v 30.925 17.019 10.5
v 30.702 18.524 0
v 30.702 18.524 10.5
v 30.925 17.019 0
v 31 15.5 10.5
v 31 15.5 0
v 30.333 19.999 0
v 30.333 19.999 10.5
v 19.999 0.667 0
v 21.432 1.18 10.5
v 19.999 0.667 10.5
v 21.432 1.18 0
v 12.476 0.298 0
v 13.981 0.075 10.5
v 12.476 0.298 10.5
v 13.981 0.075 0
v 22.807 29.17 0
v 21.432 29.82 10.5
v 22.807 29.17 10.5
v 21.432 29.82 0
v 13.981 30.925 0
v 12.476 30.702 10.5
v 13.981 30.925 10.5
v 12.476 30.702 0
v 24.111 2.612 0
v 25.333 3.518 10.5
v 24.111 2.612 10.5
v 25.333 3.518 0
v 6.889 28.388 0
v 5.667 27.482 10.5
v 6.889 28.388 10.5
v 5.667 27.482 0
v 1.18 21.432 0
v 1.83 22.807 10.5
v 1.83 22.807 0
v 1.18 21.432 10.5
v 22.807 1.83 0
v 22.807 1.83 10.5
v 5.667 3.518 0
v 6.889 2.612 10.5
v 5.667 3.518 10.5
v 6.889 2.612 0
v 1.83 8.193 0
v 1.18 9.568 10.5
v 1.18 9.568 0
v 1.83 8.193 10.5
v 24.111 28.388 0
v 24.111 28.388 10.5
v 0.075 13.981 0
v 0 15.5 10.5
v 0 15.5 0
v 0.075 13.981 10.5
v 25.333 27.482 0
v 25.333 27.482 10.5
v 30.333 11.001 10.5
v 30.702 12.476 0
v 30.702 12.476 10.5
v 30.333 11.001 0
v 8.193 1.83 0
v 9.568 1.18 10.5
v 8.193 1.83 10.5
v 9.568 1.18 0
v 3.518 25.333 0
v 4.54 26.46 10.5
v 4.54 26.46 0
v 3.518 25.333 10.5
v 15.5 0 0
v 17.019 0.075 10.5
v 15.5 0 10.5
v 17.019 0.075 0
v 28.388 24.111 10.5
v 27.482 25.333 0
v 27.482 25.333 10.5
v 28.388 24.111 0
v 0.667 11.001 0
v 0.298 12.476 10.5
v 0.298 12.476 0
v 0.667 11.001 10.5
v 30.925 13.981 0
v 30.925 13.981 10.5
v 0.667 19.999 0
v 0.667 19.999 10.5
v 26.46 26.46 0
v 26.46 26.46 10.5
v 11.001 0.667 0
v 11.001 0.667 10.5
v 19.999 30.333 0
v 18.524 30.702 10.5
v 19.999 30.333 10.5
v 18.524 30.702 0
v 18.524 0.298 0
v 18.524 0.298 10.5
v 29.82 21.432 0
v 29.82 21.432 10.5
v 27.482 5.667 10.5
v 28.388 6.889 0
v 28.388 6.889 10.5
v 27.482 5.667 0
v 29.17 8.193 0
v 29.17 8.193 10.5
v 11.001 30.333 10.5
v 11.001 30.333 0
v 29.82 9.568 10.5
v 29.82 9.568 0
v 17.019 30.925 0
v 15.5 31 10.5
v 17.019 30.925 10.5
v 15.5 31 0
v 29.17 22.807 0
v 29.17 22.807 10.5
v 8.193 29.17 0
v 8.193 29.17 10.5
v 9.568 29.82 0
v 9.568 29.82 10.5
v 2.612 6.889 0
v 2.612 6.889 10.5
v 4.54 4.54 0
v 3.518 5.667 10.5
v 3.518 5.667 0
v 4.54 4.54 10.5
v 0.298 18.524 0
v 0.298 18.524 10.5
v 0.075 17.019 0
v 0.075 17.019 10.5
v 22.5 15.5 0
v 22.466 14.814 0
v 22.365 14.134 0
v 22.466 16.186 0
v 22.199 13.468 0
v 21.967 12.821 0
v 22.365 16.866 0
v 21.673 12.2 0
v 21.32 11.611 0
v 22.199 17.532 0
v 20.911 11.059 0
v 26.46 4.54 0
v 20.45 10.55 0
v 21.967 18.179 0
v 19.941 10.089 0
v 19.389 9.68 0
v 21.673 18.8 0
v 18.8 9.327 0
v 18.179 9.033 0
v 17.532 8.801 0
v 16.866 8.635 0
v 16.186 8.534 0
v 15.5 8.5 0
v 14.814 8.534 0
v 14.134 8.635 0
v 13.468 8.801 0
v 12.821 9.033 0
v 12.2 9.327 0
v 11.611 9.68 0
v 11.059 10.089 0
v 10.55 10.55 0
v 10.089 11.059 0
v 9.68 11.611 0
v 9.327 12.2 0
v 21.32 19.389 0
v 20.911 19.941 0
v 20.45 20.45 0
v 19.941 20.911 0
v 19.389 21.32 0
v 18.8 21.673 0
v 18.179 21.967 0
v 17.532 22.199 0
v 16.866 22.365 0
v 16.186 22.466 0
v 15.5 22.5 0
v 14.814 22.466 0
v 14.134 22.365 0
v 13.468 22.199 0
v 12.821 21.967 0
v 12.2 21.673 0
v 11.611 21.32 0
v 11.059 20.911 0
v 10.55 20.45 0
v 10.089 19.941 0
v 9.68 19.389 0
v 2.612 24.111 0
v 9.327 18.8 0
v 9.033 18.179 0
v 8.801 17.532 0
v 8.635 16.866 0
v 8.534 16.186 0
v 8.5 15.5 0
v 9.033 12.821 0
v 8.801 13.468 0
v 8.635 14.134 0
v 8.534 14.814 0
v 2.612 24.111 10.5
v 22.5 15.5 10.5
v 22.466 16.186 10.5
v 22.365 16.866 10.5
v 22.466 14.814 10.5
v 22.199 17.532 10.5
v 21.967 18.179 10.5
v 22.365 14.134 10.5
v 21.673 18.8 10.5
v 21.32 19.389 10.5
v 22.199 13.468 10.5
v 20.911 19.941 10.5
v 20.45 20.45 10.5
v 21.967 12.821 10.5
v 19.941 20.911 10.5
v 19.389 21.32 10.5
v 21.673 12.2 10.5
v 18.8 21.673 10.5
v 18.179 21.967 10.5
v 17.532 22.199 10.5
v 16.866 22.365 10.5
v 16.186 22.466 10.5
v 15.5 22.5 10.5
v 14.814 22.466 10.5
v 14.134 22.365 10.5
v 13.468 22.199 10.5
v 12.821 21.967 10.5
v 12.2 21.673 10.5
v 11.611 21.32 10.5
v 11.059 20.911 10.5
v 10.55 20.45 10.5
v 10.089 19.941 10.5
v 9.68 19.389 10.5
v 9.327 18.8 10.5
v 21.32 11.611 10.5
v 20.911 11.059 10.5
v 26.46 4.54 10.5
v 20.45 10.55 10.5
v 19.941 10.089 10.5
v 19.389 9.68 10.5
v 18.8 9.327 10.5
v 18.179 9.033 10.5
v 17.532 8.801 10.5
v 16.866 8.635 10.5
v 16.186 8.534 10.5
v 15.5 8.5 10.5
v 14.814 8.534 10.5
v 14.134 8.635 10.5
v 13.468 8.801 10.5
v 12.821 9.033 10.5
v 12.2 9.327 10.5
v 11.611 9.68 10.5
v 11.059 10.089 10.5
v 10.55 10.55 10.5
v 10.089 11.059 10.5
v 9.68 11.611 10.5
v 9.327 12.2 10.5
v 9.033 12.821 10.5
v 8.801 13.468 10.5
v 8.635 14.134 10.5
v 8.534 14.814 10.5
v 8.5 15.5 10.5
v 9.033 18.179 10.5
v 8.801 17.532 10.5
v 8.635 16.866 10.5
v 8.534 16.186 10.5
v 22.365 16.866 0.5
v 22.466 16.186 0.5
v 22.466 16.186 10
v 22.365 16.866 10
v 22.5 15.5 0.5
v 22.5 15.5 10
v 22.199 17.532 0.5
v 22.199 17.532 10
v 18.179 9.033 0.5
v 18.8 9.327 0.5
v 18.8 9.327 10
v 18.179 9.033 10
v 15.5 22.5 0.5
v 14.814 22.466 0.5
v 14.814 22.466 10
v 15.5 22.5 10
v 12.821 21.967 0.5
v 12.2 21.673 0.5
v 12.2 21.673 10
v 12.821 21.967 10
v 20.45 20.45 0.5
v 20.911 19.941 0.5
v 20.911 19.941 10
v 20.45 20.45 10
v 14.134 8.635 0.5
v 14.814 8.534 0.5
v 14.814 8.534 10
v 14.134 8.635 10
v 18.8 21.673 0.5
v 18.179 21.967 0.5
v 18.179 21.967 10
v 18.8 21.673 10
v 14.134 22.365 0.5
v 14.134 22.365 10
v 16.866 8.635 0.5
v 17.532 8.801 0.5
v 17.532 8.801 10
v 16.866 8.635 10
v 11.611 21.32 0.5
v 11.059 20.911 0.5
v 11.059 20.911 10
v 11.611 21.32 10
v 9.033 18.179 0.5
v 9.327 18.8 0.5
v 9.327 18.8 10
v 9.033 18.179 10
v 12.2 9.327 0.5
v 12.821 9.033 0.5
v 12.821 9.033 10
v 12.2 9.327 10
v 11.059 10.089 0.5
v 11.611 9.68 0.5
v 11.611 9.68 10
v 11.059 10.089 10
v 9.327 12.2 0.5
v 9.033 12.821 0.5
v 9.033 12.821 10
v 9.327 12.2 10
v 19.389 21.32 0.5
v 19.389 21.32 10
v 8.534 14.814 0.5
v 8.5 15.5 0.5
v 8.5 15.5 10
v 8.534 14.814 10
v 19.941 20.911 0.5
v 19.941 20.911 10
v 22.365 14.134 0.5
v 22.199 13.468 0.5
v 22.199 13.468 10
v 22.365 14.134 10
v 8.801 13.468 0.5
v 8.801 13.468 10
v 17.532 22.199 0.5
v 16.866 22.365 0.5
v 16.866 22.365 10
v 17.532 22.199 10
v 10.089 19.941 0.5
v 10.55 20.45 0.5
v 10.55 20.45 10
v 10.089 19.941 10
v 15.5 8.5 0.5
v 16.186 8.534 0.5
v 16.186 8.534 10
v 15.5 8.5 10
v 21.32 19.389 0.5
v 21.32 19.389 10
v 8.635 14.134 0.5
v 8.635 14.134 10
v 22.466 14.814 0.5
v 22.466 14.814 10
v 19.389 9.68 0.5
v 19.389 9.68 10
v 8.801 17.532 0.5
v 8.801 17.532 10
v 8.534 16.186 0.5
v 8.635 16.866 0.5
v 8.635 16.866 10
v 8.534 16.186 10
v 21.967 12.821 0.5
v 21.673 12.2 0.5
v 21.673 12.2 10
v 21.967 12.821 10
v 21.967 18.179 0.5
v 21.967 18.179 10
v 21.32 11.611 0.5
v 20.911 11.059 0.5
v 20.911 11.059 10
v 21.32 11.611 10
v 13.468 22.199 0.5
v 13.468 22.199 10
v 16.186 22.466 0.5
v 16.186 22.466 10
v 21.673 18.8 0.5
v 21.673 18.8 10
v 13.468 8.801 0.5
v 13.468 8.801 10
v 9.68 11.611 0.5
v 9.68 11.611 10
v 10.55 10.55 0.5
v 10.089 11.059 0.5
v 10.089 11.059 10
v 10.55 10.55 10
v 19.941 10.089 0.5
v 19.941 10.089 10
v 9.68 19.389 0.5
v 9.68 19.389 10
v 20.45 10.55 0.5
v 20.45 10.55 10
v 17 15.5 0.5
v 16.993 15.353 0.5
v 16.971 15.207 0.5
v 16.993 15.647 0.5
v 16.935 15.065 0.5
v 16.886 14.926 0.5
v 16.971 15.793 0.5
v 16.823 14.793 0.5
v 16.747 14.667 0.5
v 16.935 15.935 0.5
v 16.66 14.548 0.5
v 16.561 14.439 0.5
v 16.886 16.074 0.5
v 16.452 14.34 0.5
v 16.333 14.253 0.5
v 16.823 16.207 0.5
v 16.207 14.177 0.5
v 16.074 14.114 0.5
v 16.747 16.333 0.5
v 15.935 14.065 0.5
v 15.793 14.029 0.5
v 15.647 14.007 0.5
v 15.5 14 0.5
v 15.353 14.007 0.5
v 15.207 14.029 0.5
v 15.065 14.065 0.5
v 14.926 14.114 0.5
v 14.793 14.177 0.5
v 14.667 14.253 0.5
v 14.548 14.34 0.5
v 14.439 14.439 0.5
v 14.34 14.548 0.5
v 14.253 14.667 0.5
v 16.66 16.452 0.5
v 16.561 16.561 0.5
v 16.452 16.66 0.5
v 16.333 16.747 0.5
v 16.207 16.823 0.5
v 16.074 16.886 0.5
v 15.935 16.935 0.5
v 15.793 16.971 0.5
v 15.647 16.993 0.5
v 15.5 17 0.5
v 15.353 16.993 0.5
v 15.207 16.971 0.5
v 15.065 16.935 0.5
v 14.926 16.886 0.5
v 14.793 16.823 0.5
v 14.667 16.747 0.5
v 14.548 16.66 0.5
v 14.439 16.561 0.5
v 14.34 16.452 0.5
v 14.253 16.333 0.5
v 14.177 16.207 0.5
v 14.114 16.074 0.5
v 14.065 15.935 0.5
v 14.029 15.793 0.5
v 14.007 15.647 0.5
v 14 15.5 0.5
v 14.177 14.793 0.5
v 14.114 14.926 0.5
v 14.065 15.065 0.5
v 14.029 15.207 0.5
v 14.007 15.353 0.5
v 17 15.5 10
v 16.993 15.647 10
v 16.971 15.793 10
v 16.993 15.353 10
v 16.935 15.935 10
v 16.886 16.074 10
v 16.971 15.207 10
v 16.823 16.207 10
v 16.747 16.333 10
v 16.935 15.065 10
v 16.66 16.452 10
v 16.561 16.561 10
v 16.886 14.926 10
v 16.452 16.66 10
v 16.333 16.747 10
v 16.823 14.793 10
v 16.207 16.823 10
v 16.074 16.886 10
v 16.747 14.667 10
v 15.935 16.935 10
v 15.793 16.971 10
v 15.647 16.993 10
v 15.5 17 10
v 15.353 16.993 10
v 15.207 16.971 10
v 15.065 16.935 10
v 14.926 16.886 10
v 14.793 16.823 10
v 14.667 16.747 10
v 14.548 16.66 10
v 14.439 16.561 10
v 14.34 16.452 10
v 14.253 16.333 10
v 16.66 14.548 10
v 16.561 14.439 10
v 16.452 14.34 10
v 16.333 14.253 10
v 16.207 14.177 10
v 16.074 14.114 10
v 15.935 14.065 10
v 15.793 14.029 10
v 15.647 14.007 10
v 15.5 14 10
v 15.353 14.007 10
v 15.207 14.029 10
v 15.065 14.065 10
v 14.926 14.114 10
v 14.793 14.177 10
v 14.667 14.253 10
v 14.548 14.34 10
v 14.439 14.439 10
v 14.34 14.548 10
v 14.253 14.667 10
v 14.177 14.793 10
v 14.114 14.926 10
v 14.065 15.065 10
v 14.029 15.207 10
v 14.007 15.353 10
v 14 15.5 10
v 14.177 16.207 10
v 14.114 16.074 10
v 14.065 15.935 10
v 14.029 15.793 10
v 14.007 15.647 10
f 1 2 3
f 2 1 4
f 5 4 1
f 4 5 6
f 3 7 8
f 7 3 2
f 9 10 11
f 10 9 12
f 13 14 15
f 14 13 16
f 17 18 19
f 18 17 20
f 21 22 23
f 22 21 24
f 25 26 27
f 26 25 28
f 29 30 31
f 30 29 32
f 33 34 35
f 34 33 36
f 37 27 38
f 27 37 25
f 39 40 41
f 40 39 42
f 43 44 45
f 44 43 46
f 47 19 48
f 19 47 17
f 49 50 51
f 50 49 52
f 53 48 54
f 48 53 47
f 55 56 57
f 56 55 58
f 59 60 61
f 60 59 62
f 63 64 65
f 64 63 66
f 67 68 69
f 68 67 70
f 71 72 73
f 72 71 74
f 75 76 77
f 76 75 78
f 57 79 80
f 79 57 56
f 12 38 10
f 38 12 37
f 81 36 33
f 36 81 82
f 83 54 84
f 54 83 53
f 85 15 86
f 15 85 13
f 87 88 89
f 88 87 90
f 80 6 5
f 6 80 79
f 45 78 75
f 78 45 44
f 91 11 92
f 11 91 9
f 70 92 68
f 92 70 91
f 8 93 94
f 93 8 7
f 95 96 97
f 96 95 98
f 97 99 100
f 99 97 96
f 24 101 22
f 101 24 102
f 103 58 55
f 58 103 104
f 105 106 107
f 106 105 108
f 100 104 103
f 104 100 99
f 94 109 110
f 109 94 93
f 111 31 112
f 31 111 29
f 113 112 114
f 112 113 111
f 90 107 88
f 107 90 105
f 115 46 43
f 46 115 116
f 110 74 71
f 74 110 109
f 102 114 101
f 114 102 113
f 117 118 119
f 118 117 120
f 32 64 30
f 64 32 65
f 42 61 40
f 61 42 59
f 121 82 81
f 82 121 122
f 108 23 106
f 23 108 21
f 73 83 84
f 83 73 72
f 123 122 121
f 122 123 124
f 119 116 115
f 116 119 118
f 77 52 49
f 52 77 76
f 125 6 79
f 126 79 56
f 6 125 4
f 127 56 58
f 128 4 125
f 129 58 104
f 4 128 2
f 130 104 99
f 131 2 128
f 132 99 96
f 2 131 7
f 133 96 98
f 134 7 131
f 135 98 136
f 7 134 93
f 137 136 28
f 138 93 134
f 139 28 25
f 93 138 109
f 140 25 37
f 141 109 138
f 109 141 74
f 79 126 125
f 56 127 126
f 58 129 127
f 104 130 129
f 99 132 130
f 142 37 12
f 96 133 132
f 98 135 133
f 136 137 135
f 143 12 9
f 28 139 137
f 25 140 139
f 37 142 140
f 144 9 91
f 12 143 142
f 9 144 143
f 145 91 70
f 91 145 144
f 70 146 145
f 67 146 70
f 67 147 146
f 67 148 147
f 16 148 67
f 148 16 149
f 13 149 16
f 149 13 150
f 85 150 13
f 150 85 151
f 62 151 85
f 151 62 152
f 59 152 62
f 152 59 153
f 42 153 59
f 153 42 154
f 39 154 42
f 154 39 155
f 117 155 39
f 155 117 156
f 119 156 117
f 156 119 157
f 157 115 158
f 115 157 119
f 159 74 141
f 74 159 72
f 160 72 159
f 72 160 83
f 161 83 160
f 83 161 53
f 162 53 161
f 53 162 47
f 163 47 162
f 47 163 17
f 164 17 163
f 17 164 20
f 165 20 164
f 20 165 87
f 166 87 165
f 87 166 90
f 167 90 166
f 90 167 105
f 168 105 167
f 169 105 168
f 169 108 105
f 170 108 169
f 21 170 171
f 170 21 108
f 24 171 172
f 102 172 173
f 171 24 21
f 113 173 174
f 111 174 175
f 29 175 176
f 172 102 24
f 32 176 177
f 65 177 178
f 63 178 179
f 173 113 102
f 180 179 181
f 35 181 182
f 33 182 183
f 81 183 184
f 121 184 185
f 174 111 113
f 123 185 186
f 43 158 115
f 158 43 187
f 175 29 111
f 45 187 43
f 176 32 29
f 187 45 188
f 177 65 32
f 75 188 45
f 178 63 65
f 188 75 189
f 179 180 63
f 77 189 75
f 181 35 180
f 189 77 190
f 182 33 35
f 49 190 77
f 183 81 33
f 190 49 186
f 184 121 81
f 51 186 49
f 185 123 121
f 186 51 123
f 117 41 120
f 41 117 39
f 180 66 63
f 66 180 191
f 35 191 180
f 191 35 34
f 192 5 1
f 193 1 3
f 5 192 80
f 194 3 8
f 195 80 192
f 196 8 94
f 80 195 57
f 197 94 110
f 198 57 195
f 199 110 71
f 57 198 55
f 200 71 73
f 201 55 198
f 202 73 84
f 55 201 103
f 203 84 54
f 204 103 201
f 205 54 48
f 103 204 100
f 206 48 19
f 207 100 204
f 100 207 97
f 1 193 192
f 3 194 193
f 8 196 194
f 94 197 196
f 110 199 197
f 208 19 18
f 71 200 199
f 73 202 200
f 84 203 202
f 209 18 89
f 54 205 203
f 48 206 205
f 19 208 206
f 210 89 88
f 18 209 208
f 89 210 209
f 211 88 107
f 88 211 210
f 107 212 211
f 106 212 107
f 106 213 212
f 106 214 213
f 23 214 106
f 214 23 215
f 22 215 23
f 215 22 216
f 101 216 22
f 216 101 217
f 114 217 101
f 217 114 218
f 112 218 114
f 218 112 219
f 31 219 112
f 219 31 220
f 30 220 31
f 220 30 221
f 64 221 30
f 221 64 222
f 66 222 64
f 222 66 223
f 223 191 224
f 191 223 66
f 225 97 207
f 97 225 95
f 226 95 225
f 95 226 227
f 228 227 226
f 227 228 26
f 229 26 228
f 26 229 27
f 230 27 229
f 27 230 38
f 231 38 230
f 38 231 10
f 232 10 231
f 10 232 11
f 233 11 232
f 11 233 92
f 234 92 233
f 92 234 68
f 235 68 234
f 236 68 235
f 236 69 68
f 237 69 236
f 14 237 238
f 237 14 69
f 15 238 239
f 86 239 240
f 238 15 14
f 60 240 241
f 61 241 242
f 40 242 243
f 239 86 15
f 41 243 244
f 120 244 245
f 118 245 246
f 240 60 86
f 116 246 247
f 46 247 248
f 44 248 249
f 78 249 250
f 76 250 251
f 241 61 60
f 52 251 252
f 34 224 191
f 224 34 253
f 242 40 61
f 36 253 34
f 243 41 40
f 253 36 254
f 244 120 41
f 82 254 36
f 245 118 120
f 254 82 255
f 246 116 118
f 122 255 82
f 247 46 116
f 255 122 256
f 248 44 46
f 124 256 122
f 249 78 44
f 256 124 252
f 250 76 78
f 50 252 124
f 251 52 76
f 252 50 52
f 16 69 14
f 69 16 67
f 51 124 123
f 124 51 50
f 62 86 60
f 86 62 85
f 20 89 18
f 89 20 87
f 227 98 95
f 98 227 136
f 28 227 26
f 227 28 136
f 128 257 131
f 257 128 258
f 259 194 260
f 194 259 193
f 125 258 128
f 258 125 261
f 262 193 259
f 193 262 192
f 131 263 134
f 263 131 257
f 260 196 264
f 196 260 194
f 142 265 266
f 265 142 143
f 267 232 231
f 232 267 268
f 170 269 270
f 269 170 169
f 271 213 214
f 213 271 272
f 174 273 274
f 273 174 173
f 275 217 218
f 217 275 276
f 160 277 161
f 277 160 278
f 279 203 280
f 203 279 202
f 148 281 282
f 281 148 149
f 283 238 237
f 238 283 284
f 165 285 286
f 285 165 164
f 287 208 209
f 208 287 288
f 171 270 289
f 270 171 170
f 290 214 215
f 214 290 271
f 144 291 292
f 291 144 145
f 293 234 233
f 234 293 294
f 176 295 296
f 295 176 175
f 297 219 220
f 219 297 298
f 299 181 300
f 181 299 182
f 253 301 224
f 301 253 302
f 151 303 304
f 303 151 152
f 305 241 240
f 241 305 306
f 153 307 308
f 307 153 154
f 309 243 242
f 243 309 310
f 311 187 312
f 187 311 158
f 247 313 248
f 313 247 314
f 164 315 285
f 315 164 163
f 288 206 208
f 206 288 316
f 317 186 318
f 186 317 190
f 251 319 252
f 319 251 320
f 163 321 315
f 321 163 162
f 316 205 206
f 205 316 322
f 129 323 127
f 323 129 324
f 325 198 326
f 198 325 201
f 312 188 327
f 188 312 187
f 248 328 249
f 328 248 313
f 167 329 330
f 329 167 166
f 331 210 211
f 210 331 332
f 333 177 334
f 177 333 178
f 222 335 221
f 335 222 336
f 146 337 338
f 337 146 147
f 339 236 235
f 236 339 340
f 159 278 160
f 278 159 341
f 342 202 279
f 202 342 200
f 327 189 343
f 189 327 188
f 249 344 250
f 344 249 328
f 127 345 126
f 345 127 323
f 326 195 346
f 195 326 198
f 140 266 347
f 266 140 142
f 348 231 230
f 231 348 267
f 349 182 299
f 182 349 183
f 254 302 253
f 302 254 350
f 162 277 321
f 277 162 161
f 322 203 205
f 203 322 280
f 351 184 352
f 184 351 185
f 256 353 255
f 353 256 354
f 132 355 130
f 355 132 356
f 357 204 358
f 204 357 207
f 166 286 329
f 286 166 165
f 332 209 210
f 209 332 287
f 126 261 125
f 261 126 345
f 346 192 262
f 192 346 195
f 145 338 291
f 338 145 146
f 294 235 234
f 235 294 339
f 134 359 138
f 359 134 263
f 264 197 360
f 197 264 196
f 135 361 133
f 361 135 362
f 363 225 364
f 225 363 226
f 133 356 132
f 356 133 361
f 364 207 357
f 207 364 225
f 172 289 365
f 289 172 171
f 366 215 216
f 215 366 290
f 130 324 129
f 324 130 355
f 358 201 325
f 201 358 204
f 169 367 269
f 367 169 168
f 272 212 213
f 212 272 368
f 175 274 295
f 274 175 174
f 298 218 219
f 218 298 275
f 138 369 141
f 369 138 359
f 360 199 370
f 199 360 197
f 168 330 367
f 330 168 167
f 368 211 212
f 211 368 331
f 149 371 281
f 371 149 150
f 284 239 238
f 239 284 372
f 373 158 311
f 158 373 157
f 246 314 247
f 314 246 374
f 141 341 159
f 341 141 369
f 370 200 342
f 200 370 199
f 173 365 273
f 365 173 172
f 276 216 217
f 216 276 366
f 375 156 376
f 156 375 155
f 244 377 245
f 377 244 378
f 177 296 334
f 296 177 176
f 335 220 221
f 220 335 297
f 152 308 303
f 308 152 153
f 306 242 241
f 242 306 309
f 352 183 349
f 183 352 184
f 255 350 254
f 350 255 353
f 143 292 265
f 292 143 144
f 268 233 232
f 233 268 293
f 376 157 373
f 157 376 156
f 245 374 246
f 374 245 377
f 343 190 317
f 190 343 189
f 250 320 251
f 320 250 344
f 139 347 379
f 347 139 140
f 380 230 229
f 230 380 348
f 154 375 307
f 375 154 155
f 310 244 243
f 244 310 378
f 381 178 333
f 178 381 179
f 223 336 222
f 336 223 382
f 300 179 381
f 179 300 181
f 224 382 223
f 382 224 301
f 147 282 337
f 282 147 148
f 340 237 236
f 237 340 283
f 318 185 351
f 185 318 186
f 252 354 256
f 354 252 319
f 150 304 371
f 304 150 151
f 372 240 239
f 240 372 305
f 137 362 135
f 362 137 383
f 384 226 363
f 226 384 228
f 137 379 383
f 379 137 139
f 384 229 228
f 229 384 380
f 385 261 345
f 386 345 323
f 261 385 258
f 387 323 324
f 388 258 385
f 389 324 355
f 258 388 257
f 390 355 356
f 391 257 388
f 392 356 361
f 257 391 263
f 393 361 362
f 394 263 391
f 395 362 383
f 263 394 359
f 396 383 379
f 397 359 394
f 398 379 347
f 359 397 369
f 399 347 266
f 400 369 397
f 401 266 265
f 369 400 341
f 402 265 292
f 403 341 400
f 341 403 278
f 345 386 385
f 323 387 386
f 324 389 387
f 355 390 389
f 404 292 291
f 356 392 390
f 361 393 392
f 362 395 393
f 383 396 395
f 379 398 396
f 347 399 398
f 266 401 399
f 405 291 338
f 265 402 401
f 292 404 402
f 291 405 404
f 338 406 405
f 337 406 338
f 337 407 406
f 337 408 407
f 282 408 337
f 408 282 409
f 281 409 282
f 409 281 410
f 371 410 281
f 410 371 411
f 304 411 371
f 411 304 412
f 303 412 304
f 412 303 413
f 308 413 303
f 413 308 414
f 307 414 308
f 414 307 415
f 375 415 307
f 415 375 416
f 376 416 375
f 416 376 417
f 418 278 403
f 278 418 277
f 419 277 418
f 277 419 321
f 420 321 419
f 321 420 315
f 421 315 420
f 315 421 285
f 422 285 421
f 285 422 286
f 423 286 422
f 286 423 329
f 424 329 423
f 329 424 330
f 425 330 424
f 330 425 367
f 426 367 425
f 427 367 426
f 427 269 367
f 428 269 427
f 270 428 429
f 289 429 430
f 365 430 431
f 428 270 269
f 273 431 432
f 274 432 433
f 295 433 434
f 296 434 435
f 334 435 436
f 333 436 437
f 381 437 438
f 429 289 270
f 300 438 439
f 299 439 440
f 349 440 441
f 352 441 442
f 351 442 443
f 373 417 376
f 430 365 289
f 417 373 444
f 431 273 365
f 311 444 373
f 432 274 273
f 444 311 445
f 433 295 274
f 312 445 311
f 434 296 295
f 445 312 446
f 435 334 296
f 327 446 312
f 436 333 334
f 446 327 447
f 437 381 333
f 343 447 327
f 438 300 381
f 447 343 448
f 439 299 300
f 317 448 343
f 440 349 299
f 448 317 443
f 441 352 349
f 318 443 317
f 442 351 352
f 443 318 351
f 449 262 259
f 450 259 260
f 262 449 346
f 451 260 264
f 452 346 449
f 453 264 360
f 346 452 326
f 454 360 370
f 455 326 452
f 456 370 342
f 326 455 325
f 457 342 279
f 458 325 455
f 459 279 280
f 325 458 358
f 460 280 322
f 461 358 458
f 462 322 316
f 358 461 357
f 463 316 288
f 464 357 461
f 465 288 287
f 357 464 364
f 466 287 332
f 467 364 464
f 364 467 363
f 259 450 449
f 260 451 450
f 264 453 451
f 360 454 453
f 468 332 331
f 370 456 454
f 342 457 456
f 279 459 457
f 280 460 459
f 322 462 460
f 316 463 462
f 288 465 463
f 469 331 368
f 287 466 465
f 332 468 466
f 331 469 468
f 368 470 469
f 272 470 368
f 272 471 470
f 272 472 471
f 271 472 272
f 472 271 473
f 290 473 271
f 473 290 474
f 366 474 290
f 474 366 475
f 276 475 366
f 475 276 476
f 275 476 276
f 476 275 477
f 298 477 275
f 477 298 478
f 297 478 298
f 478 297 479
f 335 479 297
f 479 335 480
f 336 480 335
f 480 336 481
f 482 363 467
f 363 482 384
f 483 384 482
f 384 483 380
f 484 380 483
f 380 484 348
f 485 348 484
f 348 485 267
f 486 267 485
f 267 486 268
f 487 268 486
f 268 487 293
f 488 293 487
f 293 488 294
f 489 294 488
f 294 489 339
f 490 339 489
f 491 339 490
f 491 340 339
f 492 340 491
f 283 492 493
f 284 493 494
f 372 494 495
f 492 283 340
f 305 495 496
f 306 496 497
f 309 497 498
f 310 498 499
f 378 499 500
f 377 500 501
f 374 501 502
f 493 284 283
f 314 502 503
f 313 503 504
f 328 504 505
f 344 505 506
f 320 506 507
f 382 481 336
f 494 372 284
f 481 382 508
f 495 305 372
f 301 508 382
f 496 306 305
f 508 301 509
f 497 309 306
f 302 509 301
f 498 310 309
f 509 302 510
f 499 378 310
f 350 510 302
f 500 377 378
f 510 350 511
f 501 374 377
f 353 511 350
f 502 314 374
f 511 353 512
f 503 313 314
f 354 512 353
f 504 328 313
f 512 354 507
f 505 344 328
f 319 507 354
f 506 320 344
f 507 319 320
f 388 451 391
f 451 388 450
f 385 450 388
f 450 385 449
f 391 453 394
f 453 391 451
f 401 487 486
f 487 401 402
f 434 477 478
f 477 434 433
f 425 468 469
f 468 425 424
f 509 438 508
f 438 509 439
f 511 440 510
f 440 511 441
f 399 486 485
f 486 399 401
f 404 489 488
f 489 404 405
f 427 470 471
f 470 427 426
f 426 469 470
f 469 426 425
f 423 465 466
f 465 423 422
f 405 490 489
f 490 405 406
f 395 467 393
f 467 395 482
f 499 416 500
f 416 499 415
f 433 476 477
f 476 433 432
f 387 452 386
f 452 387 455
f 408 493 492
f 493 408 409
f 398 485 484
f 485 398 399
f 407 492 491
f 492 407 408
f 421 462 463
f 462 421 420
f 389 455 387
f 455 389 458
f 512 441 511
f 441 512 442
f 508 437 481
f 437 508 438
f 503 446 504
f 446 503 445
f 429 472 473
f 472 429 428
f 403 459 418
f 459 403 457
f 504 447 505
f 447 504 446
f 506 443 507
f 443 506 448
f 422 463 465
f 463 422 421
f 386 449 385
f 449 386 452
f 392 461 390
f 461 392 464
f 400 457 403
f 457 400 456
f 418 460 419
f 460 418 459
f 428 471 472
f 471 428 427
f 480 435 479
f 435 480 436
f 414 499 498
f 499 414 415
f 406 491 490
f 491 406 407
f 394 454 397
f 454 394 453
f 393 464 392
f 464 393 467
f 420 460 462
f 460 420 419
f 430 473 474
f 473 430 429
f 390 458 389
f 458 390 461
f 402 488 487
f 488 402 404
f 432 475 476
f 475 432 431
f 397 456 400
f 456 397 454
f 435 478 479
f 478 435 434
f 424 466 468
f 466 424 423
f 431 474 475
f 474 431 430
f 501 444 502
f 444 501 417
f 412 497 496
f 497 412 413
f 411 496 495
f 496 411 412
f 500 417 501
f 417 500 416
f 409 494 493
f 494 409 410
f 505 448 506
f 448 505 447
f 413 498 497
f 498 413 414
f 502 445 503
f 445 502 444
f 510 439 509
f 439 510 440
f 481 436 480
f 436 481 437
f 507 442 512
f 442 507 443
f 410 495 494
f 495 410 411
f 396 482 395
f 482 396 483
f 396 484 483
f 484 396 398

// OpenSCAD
// units in mm at 1:25.4 scale (units in inches)
tireHeight = 31;
tireWidth = 10.5;
sidewallHeight = 8;
wheelHeight = 15;
wheelWidth = 10.5;

notchHeight = 0.3;
notchLength = 0.25;


module tire() {
    difference() {
        cylinder(d=tireHeight, h=tireWidth, $fn=64);
        translate([0,0,-1]) cylinder(d=wheelHeight, h=tireWidth+2, $fn=64);
    }
}

module rim() {
    difference() {
        cylinder(d=wheelHeight, h=wheelWidth, $fn=64);
        translate([0,0,-1]) cylinder(d=wheelHeight-1, h=wheelWidth+2, $fn=64);
    }

    difference() {
        translate([0,0,0.5]) cylinder(d=wheelHeight, h=wheelWidth-1, $fn=64);
        cylinder(d=3,h=wheelWidth, $fn=64);
    }
}

translate([tireHeight/2,tireHeight/2,0])
rotate([0,0,0])
{
    color(c=[0.12,0.12,0.12,1])
    /*translate([tireHeight/2,-wheelHeight/2-sidewallHeight,0])*/
        tire();
    color("gray")
    /*translate([tireHeight/2,-wheelHeight/2-sidewallHeight,0])*/
        rim();
}
